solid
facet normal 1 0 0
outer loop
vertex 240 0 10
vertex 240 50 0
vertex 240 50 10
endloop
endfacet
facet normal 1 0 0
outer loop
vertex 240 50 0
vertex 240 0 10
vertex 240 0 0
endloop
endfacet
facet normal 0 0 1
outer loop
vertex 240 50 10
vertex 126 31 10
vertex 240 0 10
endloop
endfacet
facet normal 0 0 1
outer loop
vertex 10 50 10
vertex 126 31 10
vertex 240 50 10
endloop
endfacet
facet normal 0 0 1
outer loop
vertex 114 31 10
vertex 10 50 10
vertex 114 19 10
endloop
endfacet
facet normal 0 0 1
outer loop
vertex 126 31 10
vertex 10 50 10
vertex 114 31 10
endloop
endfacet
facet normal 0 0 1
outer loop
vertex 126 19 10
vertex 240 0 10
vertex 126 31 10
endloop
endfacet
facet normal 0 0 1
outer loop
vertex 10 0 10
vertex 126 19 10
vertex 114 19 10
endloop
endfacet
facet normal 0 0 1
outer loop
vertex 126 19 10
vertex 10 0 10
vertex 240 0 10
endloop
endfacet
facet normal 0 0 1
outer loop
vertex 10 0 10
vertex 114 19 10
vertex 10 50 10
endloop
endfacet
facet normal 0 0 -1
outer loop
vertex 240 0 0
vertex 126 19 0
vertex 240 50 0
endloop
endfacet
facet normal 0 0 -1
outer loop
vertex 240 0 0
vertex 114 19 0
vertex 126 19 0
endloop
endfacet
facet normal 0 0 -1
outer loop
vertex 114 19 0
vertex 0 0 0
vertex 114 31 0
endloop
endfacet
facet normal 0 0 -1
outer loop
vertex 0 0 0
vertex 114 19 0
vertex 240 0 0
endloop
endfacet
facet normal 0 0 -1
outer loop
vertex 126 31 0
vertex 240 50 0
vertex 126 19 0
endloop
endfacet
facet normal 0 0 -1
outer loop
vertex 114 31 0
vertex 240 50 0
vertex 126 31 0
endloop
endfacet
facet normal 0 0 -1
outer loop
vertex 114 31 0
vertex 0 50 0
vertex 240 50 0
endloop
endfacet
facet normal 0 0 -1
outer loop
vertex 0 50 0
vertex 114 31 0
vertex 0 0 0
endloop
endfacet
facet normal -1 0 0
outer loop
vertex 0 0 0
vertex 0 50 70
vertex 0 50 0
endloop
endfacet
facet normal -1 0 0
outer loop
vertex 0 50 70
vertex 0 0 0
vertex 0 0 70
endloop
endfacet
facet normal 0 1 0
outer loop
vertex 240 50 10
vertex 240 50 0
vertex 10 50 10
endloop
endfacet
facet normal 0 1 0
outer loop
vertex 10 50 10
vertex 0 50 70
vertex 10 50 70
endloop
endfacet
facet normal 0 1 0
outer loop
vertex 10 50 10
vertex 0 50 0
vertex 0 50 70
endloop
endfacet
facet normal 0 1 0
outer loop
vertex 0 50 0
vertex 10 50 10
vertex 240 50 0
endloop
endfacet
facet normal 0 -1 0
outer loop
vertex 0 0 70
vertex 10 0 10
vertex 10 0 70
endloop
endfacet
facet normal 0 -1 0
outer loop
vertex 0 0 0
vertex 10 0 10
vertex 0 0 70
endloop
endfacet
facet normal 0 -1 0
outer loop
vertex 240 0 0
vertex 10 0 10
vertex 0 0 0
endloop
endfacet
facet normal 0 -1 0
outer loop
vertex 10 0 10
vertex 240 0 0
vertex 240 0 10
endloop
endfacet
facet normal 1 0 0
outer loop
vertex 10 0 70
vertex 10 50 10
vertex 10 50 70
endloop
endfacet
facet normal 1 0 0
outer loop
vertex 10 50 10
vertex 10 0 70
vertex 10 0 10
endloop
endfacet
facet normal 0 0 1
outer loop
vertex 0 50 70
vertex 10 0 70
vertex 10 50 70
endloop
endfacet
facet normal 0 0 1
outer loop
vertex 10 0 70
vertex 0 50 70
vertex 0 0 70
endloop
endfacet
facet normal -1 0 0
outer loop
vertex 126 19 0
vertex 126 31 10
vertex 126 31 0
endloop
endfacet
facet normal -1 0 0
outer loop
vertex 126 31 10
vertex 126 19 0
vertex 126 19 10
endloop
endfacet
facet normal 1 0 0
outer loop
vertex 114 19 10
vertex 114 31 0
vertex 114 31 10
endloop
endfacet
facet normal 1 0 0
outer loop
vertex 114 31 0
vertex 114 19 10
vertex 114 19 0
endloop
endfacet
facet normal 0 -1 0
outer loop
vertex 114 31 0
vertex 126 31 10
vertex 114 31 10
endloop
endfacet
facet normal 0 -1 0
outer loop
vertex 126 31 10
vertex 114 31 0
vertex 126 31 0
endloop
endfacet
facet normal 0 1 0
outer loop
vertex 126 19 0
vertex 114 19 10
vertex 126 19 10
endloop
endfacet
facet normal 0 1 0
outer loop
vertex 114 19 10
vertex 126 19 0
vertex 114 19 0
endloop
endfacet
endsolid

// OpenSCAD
$fn = 32;

// ----------------------------------------------------------------------
// Gantry bracket: 200-250 mm L bracket
// ----------------------------------------------------------------------

// --- parameters (mm) ---
base_l = 240;             // base arm length, X
arm_w = 50;               // arm width, Y
thick = 10;               // arm thickness
up_h = 60;                // vertical arm height, Z
slot_w = 12;              // adjustment slot width in the base

total_h = up_h + thick;  // overall height

difference() {
  union() {
    cube([base_l, arm_w, thick]);
    cube([thick, arm_w, total_h]);
  }
  translate([base_l / 2 - slot_w / 2, arm_w / 2 - slot_w / 2, -1])
    cube([slot_w, slot_w, thick + 2]);
}
